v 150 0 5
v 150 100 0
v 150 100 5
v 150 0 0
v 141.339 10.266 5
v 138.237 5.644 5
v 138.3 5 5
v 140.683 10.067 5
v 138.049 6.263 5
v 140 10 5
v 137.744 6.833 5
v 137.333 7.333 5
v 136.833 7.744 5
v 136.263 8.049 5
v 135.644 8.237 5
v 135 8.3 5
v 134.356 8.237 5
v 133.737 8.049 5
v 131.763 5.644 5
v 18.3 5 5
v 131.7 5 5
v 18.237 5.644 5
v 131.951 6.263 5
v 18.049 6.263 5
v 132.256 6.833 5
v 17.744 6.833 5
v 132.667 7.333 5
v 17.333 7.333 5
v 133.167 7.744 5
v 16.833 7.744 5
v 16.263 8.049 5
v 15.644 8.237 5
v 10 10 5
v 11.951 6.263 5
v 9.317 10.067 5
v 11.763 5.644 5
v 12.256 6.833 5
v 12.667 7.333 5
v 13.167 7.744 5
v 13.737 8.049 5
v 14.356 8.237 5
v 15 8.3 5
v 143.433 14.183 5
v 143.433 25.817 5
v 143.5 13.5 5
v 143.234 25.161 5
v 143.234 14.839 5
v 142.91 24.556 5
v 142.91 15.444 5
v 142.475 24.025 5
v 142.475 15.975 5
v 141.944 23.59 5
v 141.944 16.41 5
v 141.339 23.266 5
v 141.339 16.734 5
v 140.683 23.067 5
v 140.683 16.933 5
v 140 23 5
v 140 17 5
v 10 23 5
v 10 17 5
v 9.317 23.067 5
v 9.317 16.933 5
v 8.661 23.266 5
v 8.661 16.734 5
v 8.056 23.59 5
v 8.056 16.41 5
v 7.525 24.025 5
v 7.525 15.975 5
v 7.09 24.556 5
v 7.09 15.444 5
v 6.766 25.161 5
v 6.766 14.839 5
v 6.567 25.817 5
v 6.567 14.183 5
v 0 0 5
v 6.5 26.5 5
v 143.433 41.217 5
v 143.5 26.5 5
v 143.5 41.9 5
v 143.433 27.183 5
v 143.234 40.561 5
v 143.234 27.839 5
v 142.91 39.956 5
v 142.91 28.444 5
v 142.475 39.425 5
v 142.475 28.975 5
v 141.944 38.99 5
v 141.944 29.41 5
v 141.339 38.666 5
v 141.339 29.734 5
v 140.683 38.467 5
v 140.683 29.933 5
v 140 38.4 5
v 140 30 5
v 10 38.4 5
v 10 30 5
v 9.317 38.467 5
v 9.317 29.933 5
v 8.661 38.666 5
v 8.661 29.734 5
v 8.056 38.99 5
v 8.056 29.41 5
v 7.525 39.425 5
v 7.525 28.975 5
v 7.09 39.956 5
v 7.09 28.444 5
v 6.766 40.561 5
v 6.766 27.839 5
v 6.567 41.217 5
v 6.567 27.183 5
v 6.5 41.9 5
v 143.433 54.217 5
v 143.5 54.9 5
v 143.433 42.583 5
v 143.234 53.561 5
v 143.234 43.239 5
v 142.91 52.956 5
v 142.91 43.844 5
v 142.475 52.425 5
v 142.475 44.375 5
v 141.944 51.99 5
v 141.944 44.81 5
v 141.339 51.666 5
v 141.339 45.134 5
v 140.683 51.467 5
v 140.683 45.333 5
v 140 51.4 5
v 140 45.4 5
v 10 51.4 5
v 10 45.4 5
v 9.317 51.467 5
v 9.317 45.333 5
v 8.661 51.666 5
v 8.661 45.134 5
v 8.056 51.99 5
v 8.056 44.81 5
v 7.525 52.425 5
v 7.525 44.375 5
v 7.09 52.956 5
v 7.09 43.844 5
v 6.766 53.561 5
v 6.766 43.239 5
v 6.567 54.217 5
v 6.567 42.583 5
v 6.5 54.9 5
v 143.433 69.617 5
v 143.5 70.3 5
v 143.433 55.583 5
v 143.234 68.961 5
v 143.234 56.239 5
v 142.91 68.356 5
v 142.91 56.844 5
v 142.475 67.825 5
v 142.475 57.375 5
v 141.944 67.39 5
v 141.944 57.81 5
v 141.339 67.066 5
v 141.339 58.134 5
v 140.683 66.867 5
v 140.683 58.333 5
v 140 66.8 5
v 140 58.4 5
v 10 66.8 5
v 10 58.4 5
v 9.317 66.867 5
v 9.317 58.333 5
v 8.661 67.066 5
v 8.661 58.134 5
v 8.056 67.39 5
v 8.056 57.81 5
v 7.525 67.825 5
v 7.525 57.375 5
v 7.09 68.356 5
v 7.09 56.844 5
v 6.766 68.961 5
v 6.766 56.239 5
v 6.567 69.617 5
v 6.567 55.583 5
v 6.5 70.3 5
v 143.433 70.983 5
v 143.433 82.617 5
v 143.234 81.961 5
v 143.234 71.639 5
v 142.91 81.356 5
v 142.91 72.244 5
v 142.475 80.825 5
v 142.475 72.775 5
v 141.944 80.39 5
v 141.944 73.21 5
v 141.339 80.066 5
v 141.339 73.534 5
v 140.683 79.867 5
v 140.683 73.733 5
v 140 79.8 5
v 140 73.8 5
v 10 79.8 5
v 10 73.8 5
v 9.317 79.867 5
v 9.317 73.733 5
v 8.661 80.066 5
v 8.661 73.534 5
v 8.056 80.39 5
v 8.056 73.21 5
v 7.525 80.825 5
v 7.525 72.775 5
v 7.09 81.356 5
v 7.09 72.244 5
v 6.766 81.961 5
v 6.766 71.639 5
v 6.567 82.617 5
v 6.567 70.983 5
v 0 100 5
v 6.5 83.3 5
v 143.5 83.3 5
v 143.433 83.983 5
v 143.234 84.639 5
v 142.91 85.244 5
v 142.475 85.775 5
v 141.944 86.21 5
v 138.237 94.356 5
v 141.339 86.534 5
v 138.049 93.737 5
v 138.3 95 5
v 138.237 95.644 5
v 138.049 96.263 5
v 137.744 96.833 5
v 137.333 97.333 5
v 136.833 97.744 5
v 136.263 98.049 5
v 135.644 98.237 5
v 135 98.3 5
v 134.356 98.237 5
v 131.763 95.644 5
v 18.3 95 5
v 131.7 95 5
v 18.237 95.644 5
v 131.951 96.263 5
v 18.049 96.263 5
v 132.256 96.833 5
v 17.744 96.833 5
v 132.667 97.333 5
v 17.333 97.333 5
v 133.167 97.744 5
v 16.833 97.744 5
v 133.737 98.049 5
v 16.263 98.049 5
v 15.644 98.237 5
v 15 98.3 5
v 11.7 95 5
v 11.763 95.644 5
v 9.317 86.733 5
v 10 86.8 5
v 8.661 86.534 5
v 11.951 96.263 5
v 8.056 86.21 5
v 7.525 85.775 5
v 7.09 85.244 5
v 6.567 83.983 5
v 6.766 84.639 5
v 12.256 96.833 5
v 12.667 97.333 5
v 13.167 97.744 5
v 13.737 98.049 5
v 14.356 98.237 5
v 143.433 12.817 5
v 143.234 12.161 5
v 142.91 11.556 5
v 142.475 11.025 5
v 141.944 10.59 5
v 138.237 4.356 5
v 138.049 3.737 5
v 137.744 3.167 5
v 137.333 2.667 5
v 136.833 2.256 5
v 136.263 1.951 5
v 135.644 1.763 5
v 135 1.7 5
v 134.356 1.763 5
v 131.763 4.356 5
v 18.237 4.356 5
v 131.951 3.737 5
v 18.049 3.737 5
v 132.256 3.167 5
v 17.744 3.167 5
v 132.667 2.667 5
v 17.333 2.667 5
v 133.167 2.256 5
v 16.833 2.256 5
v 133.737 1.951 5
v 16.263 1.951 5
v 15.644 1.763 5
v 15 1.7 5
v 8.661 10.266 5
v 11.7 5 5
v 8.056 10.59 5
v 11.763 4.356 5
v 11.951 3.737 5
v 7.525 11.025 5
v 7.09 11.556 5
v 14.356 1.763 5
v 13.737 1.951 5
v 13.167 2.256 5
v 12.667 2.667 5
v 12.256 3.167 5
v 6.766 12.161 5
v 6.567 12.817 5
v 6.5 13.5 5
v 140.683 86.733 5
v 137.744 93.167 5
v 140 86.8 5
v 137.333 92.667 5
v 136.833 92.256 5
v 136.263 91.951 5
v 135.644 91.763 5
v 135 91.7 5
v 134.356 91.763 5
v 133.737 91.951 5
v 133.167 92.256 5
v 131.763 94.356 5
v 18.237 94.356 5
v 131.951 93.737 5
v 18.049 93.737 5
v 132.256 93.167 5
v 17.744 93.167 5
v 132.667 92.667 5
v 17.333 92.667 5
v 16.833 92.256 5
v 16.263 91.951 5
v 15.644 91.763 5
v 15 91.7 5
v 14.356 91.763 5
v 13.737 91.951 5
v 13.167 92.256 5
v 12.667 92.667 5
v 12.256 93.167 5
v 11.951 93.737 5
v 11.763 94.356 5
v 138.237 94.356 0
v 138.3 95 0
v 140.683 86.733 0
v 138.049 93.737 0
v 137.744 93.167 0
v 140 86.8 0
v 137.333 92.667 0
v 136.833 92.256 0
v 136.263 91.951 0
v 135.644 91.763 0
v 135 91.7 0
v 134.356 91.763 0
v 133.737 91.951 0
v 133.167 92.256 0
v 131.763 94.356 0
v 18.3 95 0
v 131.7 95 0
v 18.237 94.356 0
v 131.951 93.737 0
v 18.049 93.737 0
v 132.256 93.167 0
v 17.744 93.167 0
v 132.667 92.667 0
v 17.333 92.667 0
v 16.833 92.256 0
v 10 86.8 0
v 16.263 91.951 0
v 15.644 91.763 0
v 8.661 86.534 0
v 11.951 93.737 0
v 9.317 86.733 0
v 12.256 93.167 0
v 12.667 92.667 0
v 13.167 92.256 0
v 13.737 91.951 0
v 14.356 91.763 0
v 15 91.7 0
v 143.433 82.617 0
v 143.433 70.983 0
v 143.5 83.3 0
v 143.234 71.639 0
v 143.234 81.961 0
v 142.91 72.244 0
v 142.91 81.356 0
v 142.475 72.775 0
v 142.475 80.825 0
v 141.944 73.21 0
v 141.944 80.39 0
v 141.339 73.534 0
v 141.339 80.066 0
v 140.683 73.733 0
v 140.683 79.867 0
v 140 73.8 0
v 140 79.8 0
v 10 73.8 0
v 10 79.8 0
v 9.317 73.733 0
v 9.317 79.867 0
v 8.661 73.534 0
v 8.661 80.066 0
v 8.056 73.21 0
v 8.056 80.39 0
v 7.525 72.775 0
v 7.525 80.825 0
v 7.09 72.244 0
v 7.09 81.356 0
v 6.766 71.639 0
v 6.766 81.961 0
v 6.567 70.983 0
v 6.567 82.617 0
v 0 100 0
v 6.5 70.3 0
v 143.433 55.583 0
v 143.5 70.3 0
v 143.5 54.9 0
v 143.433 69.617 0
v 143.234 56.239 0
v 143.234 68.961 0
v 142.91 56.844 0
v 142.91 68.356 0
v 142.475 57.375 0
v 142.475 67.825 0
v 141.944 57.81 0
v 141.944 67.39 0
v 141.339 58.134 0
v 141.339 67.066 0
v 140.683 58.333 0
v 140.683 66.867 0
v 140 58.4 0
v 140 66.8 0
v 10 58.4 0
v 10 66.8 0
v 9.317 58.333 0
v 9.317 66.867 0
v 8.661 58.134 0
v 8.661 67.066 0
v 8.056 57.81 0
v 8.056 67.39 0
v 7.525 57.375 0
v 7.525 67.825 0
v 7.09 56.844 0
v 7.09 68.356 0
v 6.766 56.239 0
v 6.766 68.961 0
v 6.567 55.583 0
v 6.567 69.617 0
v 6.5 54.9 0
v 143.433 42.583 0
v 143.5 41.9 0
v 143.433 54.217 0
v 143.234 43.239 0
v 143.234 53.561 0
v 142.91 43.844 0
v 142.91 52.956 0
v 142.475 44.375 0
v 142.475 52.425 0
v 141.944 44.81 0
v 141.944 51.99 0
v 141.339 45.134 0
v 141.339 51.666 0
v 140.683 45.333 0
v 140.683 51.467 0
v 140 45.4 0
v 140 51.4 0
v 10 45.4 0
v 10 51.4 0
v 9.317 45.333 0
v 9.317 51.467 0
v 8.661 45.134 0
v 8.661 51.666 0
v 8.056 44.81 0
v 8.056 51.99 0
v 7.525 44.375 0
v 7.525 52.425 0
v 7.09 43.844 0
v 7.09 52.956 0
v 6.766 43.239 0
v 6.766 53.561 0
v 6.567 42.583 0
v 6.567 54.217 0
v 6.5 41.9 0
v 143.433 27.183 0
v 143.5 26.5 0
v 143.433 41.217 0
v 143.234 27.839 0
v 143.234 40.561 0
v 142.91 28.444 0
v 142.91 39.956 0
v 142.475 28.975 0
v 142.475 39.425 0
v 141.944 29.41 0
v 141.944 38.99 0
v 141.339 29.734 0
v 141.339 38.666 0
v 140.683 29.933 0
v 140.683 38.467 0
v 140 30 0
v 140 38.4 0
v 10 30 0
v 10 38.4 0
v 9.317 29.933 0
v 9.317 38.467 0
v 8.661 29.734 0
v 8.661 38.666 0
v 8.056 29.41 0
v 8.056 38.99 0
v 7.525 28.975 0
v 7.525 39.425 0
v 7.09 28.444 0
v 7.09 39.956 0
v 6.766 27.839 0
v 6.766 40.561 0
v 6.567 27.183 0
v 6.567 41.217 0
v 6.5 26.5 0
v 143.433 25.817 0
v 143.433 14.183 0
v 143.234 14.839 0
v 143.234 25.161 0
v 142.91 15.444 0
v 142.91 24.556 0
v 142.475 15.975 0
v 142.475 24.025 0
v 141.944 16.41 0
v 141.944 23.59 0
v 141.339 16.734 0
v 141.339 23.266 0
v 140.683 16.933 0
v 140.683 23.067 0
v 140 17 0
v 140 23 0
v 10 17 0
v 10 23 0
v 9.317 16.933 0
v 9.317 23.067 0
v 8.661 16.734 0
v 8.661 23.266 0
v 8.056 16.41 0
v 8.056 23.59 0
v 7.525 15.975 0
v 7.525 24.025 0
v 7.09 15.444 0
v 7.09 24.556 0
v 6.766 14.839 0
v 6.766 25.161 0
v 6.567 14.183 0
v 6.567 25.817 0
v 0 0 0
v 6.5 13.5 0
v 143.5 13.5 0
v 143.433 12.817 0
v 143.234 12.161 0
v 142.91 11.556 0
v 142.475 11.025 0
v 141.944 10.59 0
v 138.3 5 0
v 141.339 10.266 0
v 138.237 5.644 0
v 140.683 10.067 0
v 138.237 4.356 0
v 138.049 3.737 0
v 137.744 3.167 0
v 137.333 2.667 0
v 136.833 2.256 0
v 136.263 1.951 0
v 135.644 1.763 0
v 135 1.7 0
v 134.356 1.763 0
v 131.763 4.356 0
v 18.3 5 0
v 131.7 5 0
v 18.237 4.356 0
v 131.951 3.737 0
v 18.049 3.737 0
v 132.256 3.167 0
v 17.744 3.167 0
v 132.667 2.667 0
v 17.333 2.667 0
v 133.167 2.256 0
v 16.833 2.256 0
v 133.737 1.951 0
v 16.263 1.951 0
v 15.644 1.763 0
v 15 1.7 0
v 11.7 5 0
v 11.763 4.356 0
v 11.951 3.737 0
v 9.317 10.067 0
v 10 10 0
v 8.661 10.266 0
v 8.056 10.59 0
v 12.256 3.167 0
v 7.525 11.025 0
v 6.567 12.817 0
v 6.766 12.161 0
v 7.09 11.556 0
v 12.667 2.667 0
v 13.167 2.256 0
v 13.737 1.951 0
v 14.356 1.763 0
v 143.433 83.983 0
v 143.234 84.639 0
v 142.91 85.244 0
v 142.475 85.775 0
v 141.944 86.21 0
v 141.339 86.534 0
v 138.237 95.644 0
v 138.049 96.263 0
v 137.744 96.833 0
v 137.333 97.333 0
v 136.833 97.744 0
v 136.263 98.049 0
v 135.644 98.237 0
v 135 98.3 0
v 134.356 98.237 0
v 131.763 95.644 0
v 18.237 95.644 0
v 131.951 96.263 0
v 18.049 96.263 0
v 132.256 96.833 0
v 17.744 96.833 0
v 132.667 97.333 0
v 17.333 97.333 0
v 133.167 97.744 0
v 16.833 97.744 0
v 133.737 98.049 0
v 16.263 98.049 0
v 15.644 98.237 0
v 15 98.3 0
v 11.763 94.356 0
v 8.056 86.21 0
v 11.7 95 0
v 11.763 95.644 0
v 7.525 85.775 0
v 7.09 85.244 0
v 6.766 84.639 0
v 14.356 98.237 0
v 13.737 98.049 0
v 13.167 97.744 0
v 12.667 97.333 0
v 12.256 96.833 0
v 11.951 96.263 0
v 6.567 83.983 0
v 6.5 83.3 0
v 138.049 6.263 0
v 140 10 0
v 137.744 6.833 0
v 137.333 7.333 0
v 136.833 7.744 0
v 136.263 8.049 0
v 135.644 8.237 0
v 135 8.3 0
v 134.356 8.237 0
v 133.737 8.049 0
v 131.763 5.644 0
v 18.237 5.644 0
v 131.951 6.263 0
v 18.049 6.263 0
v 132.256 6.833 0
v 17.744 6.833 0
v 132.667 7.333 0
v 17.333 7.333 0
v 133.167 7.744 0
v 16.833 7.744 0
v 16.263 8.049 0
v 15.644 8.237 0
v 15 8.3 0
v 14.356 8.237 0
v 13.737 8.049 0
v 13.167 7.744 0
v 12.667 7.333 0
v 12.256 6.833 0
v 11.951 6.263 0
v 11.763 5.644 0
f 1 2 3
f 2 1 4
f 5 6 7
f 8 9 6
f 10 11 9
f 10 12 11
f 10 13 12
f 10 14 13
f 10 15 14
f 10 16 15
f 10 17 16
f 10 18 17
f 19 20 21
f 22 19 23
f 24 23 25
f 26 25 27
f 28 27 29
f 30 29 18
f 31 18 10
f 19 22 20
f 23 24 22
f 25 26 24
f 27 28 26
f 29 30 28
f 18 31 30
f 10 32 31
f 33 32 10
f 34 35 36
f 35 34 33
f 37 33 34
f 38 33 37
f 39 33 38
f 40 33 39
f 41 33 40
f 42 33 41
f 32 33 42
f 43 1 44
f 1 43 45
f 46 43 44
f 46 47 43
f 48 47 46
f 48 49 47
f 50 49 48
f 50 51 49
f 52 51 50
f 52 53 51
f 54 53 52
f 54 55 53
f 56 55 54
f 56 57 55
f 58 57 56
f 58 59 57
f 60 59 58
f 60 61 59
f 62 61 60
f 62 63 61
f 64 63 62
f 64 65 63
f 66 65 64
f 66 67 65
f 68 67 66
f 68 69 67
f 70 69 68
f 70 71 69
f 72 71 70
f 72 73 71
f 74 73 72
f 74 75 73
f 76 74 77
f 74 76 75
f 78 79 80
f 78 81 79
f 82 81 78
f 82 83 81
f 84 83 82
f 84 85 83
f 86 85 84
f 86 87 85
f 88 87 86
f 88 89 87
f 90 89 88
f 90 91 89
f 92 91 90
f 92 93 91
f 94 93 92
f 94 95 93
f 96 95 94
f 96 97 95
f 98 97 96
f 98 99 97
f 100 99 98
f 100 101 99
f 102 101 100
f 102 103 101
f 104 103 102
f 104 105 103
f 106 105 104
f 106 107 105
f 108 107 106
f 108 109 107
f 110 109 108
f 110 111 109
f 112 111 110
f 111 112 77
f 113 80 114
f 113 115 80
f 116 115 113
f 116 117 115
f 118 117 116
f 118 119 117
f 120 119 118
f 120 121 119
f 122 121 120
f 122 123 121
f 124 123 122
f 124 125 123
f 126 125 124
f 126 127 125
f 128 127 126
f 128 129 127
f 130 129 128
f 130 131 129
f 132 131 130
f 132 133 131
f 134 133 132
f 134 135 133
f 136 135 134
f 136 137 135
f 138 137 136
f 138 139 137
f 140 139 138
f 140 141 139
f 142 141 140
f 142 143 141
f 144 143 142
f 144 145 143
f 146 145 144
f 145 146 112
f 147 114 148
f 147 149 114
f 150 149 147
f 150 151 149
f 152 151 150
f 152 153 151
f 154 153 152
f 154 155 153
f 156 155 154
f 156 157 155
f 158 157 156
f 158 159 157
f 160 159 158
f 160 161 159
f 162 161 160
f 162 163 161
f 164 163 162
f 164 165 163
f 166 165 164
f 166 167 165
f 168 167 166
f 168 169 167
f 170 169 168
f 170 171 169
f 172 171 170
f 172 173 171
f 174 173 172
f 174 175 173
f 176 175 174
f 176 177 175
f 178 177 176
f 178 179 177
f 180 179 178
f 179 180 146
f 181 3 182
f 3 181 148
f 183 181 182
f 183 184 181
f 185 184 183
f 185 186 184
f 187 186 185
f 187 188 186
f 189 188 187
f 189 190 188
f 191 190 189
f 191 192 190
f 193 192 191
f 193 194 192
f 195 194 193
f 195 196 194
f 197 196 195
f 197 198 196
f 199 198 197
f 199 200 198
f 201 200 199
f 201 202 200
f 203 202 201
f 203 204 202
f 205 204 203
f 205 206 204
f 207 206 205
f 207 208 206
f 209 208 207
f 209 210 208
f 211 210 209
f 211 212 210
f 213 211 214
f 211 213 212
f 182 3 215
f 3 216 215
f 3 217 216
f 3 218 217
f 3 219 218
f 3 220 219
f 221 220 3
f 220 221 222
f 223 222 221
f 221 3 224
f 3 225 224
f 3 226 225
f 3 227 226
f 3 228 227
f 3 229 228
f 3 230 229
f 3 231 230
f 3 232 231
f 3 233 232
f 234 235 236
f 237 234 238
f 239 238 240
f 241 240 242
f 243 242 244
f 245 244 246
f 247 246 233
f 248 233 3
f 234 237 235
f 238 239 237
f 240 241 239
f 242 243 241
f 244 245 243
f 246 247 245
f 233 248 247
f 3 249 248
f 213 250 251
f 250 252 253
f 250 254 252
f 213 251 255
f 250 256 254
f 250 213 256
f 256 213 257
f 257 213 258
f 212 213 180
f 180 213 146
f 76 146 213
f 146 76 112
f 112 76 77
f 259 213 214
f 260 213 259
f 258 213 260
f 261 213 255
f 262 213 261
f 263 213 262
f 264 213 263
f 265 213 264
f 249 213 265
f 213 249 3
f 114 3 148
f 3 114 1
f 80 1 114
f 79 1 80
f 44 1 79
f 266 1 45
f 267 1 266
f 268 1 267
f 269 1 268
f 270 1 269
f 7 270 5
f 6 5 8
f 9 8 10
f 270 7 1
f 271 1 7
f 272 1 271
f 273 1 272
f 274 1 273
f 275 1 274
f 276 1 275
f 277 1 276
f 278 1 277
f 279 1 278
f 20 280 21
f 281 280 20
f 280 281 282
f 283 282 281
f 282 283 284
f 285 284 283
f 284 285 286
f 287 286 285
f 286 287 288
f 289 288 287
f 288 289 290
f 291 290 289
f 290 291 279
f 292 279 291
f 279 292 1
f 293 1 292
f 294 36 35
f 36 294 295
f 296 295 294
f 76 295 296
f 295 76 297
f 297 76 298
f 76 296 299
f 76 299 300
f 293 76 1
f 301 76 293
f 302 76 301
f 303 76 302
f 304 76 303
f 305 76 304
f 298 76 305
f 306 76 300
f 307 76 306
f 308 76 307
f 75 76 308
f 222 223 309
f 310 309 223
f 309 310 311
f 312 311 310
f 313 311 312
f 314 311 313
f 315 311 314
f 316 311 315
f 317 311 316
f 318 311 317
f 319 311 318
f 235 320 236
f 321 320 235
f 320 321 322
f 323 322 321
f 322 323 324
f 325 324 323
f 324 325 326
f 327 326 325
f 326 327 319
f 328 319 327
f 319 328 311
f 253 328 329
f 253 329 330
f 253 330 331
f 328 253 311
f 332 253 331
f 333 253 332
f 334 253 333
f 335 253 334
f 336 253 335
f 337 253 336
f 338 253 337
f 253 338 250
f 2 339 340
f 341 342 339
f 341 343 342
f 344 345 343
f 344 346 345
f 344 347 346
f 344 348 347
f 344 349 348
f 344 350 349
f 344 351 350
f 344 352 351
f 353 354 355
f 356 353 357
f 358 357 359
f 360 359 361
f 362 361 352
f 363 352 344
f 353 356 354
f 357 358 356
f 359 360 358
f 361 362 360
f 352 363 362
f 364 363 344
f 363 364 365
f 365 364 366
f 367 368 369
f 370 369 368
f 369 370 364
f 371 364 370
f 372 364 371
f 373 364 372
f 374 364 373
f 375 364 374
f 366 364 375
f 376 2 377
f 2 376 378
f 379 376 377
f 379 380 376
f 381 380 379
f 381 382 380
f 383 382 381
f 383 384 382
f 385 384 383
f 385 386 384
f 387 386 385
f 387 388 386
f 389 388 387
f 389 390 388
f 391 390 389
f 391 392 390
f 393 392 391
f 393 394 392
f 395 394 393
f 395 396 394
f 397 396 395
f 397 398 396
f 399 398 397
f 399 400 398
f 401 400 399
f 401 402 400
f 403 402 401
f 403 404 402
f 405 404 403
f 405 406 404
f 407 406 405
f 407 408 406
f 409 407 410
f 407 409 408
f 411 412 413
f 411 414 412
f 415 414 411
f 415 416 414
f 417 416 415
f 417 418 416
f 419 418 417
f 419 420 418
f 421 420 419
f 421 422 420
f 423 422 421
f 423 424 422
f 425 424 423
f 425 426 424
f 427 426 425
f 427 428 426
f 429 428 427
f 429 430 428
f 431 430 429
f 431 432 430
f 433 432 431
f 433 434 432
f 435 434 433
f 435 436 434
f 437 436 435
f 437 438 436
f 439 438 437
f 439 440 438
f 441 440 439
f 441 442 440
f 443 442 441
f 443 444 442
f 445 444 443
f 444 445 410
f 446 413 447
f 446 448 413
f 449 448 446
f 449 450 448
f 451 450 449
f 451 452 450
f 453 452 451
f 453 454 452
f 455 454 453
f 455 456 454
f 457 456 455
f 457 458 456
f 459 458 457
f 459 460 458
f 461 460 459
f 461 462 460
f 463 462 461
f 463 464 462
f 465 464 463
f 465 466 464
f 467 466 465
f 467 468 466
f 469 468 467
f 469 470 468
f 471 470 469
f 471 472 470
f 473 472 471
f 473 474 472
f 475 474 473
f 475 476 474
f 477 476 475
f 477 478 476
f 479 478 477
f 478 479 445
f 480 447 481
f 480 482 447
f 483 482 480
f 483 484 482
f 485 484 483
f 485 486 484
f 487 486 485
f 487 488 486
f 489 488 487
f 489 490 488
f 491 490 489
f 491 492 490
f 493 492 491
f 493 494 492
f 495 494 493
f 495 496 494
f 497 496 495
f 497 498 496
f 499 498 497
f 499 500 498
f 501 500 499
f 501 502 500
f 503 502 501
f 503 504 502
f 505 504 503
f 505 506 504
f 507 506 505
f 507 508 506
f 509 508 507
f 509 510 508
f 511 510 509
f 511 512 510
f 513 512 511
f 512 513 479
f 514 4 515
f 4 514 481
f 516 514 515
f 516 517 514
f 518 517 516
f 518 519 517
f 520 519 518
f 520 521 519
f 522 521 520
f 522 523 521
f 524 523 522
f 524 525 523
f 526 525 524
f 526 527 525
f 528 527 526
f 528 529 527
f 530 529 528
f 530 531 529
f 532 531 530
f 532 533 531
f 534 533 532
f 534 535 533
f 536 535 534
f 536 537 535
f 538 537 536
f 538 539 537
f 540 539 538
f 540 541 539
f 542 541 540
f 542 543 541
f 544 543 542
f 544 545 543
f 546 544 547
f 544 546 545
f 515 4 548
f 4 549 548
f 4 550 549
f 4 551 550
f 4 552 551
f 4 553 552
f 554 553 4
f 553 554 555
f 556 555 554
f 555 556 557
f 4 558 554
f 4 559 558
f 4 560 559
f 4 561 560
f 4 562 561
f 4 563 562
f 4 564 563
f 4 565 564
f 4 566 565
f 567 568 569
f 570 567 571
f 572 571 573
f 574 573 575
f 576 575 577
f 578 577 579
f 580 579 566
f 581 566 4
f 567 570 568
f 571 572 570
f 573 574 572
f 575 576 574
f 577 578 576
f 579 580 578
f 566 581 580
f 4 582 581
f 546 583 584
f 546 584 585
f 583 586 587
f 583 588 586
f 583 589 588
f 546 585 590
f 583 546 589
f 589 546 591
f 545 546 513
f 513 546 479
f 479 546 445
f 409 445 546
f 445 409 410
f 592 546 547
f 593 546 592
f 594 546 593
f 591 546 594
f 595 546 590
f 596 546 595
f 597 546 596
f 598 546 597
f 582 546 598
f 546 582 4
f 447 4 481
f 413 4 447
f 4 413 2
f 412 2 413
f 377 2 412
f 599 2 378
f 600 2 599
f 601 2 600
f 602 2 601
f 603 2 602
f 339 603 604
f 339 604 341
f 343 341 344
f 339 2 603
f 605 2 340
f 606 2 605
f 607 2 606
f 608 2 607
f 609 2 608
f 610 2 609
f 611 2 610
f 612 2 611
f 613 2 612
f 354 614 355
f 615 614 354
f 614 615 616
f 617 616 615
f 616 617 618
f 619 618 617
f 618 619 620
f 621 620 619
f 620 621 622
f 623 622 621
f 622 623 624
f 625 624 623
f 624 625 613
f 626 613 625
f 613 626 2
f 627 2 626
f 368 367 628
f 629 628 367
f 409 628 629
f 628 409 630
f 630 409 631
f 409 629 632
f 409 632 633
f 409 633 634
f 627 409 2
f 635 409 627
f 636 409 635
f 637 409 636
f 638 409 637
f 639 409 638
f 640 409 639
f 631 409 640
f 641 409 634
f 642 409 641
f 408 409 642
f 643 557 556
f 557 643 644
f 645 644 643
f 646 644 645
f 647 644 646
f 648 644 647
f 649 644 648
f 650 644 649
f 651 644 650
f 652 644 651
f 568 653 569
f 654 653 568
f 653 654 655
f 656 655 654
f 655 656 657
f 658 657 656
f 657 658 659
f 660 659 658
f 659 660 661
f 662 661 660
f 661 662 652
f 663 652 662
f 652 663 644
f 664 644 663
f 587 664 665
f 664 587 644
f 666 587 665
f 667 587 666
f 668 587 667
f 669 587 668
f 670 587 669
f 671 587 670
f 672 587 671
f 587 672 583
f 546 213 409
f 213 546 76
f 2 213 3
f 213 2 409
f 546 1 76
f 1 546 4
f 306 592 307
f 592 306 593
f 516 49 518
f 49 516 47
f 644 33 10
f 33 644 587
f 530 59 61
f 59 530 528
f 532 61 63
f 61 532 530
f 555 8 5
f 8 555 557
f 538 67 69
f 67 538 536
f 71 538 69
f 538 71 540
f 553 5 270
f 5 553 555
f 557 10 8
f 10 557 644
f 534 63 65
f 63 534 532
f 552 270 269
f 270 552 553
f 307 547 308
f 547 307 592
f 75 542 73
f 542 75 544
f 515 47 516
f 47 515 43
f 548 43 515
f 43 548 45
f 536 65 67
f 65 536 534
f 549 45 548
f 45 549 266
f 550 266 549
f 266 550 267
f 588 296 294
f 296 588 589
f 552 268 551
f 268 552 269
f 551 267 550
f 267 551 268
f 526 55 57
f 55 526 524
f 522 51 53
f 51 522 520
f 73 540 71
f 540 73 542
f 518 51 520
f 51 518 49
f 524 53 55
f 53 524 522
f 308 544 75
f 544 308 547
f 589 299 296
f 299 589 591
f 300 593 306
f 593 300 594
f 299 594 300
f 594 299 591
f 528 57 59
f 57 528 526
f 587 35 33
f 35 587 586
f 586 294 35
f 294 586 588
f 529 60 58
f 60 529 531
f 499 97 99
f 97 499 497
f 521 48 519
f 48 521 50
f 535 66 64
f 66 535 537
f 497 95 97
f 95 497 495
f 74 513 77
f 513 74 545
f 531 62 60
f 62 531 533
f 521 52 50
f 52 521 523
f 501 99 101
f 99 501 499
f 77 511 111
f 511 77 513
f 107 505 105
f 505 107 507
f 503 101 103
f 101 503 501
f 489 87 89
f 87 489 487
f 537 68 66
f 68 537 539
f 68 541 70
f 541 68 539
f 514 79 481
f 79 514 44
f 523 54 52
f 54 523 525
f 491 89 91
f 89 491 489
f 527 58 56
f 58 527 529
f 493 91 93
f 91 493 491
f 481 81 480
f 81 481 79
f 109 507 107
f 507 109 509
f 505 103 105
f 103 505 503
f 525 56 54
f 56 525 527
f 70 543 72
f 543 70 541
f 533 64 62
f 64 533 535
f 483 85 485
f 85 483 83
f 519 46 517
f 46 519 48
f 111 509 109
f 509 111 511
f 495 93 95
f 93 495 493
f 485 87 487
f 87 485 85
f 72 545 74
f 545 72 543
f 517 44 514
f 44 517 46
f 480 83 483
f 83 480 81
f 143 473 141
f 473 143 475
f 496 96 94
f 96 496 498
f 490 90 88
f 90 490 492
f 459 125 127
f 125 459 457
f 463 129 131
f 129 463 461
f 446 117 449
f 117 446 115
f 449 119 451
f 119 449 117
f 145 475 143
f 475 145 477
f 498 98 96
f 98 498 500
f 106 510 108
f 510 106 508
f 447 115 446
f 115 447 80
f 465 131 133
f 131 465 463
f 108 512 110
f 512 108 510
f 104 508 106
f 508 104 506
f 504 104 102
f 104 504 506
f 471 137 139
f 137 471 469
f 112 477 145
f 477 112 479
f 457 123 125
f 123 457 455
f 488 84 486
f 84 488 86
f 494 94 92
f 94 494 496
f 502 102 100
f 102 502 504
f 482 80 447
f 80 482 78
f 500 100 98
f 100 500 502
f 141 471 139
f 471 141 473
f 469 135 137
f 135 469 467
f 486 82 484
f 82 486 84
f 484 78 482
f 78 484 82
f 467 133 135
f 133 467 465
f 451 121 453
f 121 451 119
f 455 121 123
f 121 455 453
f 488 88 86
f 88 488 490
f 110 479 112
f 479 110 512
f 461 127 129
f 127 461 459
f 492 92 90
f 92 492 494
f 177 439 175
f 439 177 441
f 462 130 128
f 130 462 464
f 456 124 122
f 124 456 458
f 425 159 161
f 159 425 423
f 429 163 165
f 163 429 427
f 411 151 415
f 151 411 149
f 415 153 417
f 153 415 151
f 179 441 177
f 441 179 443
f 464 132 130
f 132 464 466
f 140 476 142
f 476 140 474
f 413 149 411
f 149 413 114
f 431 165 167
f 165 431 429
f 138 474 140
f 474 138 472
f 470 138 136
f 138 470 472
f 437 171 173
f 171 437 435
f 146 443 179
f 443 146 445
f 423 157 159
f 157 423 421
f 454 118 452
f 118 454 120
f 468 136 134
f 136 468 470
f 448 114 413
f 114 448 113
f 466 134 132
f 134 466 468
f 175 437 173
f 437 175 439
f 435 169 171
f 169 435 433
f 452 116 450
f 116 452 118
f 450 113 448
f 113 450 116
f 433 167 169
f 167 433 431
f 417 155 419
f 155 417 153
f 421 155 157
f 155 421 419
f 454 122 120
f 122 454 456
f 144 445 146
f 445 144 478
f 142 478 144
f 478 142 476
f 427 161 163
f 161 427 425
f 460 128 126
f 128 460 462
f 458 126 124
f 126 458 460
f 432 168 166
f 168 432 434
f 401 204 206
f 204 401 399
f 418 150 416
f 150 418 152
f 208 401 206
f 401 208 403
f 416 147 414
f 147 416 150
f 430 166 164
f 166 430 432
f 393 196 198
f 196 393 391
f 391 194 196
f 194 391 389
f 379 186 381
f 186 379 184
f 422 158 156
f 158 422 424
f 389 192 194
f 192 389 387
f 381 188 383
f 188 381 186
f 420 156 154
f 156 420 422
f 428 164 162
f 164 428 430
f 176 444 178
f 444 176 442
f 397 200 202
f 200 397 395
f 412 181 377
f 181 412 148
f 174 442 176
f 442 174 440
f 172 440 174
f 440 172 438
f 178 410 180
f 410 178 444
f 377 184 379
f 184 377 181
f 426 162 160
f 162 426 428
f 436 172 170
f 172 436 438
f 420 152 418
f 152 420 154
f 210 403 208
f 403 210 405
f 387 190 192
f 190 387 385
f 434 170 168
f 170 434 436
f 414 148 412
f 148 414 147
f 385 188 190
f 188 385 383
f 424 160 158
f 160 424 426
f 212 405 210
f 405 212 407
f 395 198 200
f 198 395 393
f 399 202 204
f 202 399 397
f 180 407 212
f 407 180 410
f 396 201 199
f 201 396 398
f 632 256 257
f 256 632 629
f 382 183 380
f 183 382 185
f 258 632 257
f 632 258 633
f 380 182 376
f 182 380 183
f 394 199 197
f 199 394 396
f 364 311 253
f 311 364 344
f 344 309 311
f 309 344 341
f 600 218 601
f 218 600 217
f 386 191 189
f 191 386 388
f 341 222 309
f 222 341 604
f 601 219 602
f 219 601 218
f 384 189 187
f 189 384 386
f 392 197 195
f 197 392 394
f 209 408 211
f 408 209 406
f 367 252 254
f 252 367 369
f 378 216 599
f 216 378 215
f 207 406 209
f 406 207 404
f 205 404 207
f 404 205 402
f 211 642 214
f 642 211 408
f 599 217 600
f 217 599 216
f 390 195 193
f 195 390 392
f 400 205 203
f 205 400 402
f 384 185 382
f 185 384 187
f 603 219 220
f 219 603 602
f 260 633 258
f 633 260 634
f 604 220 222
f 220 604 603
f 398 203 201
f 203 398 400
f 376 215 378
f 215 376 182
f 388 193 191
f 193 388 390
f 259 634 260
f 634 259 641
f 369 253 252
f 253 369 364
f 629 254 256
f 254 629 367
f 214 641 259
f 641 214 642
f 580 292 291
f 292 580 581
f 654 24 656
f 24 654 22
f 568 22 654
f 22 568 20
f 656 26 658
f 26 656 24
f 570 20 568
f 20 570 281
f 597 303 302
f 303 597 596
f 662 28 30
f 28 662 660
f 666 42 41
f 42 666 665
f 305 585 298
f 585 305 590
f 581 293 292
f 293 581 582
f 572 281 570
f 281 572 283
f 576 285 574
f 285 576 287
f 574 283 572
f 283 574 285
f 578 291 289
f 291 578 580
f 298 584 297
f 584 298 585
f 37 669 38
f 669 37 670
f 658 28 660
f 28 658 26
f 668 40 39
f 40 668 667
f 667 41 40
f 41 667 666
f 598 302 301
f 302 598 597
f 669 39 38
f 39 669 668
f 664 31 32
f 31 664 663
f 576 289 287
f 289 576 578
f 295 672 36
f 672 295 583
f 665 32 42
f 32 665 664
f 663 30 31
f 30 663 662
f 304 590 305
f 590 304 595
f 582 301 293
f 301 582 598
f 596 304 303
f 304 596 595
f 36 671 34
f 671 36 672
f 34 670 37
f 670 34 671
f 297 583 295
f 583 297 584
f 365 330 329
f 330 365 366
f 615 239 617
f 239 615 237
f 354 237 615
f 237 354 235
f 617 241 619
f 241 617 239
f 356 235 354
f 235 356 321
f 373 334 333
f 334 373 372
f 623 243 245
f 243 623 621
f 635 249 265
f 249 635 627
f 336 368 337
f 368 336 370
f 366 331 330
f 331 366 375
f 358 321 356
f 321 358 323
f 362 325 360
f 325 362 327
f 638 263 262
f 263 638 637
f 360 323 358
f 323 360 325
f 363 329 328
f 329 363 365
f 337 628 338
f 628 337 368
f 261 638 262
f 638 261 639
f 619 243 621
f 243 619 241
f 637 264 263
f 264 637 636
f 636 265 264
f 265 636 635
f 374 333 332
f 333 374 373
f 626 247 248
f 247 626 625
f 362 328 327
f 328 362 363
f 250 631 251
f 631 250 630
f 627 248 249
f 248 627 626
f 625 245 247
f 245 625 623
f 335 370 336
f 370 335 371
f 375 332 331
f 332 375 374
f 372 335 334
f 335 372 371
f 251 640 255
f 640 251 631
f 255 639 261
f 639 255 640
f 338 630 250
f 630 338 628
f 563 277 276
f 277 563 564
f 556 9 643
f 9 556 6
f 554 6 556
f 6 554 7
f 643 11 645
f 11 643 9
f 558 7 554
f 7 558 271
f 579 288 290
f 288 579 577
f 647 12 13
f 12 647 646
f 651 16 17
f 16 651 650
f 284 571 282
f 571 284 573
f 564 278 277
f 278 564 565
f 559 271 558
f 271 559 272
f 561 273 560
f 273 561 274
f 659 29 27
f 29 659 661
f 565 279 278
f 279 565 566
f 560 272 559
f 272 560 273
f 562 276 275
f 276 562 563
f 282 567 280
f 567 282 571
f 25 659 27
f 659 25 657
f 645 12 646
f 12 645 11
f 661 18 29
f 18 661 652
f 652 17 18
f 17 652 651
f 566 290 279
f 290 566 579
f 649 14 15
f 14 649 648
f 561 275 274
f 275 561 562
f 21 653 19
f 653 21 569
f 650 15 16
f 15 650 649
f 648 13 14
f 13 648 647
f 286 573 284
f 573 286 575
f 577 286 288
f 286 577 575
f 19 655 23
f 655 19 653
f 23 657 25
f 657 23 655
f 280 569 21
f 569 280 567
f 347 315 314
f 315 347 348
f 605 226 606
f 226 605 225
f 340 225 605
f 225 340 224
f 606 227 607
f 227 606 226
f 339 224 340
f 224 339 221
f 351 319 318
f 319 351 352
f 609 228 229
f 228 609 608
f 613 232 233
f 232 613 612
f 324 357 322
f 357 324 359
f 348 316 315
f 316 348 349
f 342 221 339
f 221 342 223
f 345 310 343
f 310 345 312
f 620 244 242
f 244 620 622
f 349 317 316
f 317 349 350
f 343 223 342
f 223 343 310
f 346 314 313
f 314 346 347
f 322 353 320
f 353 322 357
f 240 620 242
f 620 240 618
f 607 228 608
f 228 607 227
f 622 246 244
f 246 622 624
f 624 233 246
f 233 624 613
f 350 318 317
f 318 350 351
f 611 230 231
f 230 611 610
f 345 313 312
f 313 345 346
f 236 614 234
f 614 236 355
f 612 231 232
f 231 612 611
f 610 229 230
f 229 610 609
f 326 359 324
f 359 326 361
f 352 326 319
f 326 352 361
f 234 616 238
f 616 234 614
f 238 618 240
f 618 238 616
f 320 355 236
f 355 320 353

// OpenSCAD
$fn = 32;

// ----------------------------------------------------------------------
// Slotted panel: 150 x 100 mm, 6 рядов of slots
// ----------------------------------------------------------------------

// --- parameters (mm) ---
panel_w = 150;            // panel width
panel_d = 100;            // panel depth
thick = 5;                // panel thickness
slot_w = 7;               // slot width
pitch0 = 13;              // first row pitch
pitch_step = 2.4;         // pitch increase per row
margin = 10;              // margin around the slot field
rows = 6;                 // number of slot rows
mount_d = 6.6;            // mounting holes
mount_x = 60;             // mounting hole offset

difference() {
  union() {
    cube([panel_w, panel_d, thick]);
  }
  /* slot rows: stadium shaped cutters, 2.5 mm clear of both faces */
  /* row 0: pitch 13, length 130 */
  hull() {
    translate([10, 13.5, -2.5]) cylinder(h = thick + 5, d = slot_w);
    translate([140, 13.5, -2.5]) cylinder(h = thick + 5, d = slot_w);
  }
  /* row 1: pitch 15.4, length 130 */
  hull() {
    translate([10, 26.5, -2.5]) cylinder(h = thick + 5, d = slot_w);
    translate([140, 26.5, -2.5]) cylinder(h = thick + 5, d = slot_w);
  }
  /* row 2: pitch 13, length 130 */
  hull() {
    translate([10, 41.9, -2.5]) cylinder(h = thick + 5, d = slot_w);
    translate([140, 41.9, -2.5]) cylinder(h = thick + 5, d = slot_w);
  }
  /* row 3: pitch 15.4, length 130 */
  hull() {
    translate([10, 54.9, -2.5]) cylinder(h = thick + 5, d = slot_w);
    translate([140, 54.9, -2.5]) cylinder(h = thick + 5, d = slot_w);
  }
  /* row 4: pitch 13, length 130 */
  hull() {
    translate([10, 70.3, -2.5]) cylinder(h = thick + 5, d = slot_w);
    translate([140, 70.3, -2.5]) cylinder(h = thick + 5, d = slot_w);
  }
  /* row 5: pitch 15.4, length 130 */
  hull() {
    translate([10, 83.3, -2.5]) cylinder(h = thick + 5, d = slot_w);
    translate([140, 83.3, -2.5]) cylinder(h = thick + 5, d = slot_w);
  }
  translate([15, 5, -2.5]) cylinder(h = 10, d = mount_d);
  translate([15, 95, -2.5]) cylinder(h = 10, d = mount_d);
  translate([135, 5, -2.5]) cylinder(h = 10, d = mount_d);
  translate([135, 95, -2.5]) cylinder(h = 10, d = mount_d);
}
